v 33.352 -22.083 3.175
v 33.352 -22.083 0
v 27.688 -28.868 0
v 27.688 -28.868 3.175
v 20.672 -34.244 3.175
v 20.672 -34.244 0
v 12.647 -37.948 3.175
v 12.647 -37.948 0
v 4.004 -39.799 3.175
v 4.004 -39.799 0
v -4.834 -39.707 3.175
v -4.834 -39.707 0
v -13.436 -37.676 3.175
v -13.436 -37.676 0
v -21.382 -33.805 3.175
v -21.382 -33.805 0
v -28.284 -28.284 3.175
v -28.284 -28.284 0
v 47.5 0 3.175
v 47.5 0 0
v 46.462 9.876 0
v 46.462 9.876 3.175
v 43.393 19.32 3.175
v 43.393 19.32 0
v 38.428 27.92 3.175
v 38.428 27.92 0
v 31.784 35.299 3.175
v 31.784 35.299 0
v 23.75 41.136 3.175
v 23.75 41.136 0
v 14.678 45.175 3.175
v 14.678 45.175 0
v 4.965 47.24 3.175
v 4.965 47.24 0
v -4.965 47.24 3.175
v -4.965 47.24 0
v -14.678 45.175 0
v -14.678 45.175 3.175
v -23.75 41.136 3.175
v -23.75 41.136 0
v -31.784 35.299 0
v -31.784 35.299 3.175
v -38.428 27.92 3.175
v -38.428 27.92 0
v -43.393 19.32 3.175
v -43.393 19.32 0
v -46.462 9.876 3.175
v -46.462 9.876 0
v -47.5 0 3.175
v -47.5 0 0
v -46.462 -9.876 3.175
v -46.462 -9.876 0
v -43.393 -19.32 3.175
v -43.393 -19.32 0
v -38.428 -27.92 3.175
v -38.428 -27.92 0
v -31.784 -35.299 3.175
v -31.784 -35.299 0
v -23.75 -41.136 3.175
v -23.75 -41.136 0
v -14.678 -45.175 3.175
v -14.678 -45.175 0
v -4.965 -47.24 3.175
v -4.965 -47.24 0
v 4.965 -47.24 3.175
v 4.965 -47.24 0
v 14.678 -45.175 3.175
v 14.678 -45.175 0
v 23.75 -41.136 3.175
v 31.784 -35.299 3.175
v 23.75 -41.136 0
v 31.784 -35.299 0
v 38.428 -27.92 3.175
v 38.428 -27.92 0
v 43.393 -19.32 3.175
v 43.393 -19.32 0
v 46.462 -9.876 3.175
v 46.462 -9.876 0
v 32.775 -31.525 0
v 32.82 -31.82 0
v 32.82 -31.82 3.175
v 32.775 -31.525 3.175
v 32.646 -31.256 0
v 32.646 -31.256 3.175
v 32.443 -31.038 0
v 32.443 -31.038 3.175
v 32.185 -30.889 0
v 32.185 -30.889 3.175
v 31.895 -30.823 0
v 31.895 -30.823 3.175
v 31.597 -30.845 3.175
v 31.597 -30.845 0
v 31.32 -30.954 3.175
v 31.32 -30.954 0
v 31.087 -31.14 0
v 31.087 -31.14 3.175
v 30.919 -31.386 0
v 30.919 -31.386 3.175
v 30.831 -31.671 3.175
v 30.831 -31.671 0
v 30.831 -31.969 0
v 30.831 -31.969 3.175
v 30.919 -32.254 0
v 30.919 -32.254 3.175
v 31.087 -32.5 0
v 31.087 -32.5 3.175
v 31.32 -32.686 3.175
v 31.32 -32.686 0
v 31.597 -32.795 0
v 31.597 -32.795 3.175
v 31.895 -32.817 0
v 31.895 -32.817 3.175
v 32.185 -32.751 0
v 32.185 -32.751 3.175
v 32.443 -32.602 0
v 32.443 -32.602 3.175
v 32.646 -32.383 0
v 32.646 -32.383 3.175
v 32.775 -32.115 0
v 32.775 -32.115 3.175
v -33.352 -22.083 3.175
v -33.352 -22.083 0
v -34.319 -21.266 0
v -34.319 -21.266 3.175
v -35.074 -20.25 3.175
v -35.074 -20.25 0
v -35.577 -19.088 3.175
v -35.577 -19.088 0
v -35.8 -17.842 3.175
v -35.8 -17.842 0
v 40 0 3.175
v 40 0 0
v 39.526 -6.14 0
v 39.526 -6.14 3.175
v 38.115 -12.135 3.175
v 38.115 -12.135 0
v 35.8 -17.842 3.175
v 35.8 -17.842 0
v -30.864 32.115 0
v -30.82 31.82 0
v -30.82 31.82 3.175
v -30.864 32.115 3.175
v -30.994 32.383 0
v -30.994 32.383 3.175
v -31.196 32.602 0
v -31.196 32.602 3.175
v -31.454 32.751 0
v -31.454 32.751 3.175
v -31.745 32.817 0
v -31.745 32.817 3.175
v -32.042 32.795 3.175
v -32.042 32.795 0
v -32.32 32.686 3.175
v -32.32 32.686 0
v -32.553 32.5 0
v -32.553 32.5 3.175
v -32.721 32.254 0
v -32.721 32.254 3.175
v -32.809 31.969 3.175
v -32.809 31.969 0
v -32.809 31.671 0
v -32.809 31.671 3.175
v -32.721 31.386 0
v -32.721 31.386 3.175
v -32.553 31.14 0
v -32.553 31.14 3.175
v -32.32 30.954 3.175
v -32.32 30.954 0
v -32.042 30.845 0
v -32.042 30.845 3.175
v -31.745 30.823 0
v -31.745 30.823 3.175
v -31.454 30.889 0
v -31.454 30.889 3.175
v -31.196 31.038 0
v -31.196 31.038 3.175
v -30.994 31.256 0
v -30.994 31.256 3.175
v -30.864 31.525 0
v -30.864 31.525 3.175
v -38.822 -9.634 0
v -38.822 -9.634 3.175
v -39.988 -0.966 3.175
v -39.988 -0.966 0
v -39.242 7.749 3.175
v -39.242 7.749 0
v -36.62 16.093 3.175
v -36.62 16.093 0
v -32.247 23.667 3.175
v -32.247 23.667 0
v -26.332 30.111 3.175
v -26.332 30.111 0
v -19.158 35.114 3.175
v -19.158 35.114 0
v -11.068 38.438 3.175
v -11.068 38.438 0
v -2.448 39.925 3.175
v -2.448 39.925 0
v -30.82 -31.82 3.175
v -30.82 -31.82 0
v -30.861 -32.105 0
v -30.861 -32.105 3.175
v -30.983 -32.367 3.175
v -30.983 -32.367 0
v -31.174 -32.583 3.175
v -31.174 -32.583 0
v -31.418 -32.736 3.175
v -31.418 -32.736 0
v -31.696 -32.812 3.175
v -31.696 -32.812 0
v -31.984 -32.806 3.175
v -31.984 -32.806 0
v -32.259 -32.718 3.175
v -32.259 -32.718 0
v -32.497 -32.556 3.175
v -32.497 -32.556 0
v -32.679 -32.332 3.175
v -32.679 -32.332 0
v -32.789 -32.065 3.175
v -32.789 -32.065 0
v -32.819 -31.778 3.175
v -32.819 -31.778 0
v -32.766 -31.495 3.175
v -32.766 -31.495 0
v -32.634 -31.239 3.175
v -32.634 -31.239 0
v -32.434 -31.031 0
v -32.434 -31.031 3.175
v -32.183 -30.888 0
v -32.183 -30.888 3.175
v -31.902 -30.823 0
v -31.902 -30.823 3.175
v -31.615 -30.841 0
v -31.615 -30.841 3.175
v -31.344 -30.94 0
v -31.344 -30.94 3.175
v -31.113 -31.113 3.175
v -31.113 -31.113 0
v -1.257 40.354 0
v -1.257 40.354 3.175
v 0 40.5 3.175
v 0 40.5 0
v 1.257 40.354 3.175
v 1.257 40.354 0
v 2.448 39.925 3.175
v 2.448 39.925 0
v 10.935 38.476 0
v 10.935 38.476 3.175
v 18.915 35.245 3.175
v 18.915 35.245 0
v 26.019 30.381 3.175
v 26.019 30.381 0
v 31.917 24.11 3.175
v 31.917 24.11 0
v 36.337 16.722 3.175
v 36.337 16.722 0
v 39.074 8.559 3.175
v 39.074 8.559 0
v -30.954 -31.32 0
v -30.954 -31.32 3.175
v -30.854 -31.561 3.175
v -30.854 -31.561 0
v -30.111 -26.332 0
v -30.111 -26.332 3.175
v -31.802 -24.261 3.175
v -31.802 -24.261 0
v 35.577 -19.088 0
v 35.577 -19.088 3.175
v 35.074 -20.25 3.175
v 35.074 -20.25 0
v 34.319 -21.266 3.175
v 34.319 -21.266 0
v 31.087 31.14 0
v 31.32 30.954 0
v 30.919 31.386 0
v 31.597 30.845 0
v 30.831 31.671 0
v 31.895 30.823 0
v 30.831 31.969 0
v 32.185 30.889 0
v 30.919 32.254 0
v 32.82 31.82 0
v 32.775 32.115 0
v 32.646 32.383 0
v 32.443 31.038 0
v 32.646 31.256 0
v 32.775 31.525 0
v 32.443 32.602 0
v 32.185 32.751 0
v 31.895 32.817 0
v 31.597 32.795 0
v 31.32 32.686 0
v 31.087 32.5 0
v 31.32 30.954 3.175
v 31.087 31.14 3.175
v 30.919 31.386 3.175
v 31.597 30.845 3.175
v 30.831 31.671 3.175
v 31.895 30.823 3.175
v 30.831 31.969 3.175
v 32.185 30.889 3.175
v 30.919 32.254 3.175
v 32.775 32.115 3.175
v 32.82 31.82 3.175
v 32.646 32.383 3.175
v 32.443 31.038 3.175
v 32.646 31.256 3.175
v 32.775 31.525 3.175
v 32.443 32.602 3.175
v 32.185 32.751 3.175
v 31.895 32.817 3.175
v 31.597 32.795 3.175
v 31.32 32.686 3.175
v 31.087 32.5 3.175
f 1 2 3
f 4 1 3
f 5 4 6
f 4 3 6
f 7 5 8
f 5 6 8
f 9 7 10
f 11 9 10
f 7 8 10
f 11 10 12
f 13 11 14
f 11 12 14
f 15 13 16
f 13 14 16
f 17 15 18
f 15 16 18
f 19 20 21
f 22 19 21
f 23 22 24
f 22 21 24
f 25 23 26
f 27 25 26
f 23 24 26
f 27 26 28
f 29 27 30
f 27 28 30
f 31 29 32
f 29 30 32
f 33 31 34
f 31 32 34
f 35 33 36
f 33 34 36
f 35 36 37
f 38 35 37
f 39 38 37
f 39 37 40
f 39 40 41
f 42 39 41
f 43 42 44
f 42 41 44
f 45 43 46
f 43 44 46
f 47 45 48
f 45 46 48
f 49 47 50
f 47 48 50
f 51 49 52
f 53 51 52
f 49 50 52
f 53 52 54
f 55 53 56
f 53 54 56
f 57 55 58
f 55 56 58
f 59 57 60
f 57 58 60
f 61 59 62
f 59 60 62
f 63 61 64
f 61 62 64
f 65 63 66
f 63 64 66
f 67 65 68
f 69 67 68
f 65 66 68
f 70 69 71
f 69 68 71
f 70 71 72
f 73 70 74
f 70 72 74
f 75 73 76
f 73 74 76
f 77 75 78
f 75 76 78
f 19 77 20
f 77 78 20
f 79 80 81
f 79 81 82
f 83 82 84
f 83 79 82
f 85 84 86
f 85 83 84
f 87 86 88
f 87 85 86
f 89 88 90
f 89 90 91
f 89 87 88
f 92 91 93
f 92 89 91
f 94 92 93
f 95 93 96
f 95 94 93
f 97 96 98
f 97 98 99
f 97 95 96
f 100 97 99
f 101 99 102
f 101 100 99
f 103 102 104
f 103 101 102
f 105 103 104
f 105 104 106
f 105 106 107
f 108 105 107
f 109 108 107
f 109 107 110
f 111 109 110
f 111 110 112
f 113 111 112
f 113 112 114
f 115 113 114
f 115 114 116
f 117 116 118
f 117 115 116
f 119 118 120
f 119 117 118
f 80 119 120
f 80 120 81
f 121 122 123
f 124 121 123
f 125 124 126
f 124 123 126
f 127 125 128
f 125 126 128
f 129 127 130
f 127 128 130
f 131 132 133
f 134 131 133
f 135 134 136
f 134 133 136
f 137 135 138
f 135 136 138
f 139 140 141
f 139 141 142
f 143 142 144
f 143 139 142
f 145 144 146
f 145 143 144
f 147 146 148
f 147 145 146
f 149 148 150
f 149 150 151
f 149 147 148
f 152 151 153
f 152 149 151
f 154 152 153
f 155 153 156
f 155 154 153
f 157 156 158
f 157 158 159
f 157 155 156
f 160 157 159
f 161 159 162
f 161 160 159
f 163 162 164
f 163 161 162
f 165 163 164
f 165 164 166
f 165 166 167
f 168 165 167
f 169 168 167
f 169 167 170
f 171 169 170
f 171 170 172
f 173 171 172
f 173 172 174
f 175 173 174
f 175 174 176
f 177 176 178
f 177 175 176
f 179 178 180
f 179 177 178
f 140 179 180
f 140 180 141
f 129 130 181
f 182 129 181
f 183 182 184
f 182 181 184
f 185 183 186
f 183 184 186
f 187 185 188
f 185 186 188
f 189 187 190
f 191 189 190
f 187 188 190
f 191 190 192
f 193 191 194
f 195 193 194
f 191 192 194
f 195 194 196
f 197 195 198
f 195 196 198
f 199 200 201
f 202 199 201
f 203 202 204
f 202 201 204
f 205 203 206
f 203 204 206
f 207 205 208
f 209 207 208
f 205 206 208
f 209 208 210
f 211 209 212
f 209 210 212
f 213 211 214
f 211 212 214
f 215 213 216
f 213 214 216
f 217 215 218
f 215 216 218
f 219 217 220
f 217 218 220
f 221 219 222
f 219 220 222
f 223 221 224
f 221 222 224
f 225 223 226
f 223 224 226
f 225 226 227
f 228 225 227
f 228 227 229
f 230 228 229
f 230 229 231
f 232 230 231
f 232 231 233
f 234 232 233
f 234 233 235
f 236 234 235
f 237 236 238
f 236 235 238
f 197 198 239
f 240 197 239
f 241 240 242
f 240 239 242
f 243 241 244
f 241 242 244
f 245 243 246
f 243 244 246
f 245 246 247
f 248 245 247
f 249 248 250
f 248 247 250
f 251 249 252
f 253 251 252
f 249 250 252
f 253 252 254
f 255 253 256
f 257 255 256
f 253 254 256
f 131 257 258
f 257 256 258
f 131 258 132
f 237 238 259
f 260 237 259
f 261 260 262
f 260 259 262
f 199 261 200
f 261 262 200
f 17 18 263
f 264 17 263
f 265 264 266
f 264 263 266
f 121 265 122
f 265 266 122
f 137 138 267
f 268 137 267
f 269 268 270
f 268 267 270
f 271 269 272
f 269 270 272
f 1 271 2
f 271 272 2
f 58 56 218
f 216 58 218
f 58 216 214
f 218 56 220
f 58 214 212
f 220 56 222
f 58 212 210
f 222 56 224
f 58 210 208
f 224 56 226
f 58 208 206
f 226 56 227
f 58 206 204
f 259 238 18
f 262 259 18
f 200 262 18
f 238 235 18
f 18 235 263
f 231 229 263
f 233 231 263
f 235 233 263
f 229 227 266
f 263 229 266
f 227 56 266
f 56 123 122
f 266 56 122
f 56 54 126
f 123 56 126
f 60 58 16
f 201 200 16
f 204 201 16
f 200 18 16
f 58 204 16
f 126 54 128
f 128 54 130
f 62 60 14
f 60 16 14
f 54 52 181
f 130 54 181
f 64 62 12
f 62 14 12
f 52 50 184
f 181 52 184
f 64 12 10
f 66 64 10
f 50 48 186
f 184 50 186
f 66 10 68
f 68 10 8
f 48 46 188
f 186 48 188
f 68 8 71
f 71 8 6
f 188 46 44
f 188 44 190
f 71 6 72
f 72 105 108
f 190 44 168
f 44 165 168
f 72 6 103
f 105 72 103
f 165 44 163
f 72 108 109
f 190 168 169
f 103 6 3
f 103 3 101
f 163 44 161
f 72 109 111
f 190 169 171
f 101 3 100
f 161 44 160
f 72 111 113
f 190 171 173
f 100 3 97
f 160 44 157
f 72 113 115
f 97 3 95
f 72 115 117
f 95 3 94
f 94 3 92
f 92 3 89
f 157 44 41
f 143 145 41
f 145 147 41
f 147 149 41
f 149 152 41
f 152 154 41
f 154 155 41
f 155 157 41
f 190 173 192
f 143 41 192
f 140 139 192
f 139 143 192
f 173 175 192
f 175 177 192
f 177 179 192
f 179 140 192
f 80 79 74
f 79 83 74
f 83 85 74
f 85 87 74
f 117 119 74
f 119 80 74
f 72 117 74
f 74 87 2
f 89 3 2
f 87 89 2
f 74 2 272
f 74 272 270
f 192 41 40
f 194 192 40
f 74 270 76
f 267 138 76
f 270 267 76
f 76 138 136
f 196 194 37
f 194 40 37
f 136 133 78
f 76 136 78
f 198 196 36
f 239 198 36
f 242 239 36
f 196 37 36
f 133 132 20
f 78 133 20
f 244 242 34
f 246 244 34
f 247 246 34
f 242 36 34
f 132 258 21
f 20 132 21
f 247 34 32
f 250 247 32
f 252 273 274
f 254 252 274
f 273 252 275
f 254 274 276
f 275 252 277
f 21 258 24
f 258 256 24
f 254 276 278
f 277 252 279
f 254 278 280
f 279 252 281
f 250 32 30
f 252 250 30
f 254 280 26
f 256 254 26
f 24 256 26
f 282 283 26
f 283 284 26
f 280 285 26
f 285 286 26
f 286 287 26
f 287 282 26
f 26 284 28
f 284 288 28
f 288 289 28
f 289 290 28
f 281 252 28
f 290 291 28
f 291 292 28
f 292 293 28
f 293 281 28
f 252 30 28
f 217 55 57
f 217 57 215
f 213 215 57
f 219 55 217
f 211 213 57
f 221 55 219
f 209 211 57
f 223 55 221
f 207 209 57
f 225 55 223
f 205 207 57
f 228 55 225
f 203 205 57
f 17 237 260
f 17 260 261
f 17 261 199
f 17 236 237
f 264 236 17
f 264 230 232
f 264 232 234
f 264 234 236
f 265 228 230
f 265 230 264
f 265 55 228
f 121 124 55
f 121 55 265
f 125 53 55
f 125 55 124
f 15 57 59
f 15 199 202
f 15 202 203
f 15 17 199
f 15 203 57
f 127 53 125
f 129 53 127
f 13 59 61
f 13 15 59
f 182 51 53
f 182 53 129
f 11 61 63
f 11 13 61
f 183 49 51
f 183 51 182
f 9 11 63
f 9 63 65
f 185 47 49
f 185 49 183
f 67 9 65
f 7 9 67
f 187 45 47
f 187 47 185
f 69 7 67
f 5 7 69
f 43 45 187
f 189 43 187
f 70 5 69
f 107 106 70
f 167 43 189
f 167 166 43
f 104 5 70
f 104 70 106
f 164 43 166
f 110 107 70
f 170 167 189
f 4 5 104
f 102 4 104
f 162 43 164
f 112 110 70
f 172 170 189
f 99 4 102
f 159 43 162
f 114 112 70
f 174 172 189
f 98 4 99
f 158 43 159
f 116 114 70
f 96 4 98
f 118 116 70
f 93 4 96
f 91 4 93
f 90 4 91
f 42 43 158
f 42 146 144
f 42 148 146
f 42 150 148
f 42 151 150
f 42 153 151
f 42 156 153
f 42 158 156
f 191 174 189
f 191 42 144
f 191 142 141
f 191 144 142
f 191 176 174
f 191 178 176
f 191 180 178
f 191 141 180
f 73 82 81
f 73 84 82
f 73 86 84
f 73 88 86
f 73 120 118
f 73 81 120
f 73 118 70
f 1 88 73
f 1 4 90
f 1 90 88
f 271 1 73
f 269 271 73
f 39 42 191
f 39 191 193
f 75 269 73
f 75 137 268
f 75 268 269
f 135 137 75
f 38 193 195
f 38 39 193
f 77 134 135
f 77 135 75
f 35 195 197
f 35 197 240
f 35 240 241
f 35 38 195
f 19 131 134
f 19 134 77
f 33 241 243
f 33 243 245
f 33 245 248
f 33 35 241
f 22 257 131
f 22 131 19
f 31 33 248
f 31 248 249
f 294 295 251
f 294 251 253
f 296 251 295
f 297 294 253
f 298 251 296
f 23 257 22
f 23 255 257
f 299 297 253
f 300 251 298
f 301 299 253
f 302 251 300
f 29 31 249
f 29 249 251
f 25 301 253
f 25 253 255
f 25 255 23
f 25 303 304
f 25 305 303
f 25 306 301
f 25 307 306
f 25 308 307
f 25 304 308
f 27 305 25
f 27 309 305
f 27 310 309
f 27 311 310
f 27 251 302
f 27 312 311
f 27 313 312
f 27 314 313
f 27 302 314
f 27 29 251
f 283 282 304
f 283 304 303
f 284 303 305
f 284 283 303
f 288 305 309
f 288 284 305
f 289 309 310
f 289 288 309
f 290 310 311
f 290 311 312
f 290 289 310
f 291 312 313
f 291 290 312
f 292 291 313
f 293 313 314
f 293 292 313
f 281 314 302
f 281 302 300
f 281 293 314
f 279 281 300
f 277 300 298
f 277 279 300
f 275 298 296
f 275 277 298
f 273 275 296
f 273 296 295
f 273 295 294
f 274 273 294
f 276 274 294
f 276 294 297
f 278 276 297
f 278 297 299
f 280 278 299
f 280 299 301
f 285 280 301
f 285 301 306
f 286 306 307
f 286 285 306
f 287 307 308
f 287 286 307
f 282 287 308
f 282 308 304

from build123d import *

# Parameters (mm, degrees)
F0_R     = 47.5
F0_R_2   = 1
F1_DEPTH = 3.175


with BuildPart() as f1:
    # F0 (on Top) → F1 (new body)
    with BuildSketch(Plane.XY):
        Circle(F0_R)
        with BuildLine():
            ThreePointArc((-30.8198051534, -31.8198051534), (-32.7436846859, -32.2024885858), (-31.1126983722, -31.1126983722))
            ThreePointArc((-31.1126983722, -31.1126983722), (-30.8959256209, -31.437121721), (-30.8198051534, -31.8198051534))
        make_face(mode=Mode.SUBTRACT)
        with Locations((31.8198051534, -31.8198051534)):
            Circle(F0_R_2, mode=Mode.SUBTRACT)
        with Locations((-31.8198051534, 31.8198051534)):
            Circle(F0_R_2, mode=Mode.SUBTRACT)
        with BuildLine():
            ThreePointArc((33.3518936085, -22.0828257415), (4.0043327396, -39.7990617893), (-28.2842712475, -28.2842712475))
            ThreePointArc((-28.2842712475, -28.2842712475), (-30.9736773104, -25.3106956418), (-33.3518936085, -22.0828257415))
            ThreePointArc((-33.3518936085, -22.0828257415), (-35.0740288533, -20.25), (-35.8002348837, -17.8421742585))
            ThreePointArc((-35.8002348837, -17.8421742585), (-34.6410161514, 20), (-2.4483412752, 39.925))
            ThreePointArc((-2.4483412752, 39.925), (0, 40.5), (2.4483412752, 39.925))
            ThreePointArc((2.4483412752, 39.925), (29.1370352902, 27.4049844827), (40, 0))
            ThreePointArc((40, 0), (38.9359049936, -9.1648951072), (35.8002348837, -17.8421742585))
            ThreePointArc((35.8002348837, -17.8421742585), (35.0740288533, -20.25), (33.3518936085, -22.0828257415))
        make_face(mode=Mode.SUBTRACT)
        with Locations((31.8198051534, 31.8198051534)):
            Circle(F0_R_2, mode=Mode.SUBTRACT)
    extrude(amount=F1_DEPTH)


solid = f1.part
